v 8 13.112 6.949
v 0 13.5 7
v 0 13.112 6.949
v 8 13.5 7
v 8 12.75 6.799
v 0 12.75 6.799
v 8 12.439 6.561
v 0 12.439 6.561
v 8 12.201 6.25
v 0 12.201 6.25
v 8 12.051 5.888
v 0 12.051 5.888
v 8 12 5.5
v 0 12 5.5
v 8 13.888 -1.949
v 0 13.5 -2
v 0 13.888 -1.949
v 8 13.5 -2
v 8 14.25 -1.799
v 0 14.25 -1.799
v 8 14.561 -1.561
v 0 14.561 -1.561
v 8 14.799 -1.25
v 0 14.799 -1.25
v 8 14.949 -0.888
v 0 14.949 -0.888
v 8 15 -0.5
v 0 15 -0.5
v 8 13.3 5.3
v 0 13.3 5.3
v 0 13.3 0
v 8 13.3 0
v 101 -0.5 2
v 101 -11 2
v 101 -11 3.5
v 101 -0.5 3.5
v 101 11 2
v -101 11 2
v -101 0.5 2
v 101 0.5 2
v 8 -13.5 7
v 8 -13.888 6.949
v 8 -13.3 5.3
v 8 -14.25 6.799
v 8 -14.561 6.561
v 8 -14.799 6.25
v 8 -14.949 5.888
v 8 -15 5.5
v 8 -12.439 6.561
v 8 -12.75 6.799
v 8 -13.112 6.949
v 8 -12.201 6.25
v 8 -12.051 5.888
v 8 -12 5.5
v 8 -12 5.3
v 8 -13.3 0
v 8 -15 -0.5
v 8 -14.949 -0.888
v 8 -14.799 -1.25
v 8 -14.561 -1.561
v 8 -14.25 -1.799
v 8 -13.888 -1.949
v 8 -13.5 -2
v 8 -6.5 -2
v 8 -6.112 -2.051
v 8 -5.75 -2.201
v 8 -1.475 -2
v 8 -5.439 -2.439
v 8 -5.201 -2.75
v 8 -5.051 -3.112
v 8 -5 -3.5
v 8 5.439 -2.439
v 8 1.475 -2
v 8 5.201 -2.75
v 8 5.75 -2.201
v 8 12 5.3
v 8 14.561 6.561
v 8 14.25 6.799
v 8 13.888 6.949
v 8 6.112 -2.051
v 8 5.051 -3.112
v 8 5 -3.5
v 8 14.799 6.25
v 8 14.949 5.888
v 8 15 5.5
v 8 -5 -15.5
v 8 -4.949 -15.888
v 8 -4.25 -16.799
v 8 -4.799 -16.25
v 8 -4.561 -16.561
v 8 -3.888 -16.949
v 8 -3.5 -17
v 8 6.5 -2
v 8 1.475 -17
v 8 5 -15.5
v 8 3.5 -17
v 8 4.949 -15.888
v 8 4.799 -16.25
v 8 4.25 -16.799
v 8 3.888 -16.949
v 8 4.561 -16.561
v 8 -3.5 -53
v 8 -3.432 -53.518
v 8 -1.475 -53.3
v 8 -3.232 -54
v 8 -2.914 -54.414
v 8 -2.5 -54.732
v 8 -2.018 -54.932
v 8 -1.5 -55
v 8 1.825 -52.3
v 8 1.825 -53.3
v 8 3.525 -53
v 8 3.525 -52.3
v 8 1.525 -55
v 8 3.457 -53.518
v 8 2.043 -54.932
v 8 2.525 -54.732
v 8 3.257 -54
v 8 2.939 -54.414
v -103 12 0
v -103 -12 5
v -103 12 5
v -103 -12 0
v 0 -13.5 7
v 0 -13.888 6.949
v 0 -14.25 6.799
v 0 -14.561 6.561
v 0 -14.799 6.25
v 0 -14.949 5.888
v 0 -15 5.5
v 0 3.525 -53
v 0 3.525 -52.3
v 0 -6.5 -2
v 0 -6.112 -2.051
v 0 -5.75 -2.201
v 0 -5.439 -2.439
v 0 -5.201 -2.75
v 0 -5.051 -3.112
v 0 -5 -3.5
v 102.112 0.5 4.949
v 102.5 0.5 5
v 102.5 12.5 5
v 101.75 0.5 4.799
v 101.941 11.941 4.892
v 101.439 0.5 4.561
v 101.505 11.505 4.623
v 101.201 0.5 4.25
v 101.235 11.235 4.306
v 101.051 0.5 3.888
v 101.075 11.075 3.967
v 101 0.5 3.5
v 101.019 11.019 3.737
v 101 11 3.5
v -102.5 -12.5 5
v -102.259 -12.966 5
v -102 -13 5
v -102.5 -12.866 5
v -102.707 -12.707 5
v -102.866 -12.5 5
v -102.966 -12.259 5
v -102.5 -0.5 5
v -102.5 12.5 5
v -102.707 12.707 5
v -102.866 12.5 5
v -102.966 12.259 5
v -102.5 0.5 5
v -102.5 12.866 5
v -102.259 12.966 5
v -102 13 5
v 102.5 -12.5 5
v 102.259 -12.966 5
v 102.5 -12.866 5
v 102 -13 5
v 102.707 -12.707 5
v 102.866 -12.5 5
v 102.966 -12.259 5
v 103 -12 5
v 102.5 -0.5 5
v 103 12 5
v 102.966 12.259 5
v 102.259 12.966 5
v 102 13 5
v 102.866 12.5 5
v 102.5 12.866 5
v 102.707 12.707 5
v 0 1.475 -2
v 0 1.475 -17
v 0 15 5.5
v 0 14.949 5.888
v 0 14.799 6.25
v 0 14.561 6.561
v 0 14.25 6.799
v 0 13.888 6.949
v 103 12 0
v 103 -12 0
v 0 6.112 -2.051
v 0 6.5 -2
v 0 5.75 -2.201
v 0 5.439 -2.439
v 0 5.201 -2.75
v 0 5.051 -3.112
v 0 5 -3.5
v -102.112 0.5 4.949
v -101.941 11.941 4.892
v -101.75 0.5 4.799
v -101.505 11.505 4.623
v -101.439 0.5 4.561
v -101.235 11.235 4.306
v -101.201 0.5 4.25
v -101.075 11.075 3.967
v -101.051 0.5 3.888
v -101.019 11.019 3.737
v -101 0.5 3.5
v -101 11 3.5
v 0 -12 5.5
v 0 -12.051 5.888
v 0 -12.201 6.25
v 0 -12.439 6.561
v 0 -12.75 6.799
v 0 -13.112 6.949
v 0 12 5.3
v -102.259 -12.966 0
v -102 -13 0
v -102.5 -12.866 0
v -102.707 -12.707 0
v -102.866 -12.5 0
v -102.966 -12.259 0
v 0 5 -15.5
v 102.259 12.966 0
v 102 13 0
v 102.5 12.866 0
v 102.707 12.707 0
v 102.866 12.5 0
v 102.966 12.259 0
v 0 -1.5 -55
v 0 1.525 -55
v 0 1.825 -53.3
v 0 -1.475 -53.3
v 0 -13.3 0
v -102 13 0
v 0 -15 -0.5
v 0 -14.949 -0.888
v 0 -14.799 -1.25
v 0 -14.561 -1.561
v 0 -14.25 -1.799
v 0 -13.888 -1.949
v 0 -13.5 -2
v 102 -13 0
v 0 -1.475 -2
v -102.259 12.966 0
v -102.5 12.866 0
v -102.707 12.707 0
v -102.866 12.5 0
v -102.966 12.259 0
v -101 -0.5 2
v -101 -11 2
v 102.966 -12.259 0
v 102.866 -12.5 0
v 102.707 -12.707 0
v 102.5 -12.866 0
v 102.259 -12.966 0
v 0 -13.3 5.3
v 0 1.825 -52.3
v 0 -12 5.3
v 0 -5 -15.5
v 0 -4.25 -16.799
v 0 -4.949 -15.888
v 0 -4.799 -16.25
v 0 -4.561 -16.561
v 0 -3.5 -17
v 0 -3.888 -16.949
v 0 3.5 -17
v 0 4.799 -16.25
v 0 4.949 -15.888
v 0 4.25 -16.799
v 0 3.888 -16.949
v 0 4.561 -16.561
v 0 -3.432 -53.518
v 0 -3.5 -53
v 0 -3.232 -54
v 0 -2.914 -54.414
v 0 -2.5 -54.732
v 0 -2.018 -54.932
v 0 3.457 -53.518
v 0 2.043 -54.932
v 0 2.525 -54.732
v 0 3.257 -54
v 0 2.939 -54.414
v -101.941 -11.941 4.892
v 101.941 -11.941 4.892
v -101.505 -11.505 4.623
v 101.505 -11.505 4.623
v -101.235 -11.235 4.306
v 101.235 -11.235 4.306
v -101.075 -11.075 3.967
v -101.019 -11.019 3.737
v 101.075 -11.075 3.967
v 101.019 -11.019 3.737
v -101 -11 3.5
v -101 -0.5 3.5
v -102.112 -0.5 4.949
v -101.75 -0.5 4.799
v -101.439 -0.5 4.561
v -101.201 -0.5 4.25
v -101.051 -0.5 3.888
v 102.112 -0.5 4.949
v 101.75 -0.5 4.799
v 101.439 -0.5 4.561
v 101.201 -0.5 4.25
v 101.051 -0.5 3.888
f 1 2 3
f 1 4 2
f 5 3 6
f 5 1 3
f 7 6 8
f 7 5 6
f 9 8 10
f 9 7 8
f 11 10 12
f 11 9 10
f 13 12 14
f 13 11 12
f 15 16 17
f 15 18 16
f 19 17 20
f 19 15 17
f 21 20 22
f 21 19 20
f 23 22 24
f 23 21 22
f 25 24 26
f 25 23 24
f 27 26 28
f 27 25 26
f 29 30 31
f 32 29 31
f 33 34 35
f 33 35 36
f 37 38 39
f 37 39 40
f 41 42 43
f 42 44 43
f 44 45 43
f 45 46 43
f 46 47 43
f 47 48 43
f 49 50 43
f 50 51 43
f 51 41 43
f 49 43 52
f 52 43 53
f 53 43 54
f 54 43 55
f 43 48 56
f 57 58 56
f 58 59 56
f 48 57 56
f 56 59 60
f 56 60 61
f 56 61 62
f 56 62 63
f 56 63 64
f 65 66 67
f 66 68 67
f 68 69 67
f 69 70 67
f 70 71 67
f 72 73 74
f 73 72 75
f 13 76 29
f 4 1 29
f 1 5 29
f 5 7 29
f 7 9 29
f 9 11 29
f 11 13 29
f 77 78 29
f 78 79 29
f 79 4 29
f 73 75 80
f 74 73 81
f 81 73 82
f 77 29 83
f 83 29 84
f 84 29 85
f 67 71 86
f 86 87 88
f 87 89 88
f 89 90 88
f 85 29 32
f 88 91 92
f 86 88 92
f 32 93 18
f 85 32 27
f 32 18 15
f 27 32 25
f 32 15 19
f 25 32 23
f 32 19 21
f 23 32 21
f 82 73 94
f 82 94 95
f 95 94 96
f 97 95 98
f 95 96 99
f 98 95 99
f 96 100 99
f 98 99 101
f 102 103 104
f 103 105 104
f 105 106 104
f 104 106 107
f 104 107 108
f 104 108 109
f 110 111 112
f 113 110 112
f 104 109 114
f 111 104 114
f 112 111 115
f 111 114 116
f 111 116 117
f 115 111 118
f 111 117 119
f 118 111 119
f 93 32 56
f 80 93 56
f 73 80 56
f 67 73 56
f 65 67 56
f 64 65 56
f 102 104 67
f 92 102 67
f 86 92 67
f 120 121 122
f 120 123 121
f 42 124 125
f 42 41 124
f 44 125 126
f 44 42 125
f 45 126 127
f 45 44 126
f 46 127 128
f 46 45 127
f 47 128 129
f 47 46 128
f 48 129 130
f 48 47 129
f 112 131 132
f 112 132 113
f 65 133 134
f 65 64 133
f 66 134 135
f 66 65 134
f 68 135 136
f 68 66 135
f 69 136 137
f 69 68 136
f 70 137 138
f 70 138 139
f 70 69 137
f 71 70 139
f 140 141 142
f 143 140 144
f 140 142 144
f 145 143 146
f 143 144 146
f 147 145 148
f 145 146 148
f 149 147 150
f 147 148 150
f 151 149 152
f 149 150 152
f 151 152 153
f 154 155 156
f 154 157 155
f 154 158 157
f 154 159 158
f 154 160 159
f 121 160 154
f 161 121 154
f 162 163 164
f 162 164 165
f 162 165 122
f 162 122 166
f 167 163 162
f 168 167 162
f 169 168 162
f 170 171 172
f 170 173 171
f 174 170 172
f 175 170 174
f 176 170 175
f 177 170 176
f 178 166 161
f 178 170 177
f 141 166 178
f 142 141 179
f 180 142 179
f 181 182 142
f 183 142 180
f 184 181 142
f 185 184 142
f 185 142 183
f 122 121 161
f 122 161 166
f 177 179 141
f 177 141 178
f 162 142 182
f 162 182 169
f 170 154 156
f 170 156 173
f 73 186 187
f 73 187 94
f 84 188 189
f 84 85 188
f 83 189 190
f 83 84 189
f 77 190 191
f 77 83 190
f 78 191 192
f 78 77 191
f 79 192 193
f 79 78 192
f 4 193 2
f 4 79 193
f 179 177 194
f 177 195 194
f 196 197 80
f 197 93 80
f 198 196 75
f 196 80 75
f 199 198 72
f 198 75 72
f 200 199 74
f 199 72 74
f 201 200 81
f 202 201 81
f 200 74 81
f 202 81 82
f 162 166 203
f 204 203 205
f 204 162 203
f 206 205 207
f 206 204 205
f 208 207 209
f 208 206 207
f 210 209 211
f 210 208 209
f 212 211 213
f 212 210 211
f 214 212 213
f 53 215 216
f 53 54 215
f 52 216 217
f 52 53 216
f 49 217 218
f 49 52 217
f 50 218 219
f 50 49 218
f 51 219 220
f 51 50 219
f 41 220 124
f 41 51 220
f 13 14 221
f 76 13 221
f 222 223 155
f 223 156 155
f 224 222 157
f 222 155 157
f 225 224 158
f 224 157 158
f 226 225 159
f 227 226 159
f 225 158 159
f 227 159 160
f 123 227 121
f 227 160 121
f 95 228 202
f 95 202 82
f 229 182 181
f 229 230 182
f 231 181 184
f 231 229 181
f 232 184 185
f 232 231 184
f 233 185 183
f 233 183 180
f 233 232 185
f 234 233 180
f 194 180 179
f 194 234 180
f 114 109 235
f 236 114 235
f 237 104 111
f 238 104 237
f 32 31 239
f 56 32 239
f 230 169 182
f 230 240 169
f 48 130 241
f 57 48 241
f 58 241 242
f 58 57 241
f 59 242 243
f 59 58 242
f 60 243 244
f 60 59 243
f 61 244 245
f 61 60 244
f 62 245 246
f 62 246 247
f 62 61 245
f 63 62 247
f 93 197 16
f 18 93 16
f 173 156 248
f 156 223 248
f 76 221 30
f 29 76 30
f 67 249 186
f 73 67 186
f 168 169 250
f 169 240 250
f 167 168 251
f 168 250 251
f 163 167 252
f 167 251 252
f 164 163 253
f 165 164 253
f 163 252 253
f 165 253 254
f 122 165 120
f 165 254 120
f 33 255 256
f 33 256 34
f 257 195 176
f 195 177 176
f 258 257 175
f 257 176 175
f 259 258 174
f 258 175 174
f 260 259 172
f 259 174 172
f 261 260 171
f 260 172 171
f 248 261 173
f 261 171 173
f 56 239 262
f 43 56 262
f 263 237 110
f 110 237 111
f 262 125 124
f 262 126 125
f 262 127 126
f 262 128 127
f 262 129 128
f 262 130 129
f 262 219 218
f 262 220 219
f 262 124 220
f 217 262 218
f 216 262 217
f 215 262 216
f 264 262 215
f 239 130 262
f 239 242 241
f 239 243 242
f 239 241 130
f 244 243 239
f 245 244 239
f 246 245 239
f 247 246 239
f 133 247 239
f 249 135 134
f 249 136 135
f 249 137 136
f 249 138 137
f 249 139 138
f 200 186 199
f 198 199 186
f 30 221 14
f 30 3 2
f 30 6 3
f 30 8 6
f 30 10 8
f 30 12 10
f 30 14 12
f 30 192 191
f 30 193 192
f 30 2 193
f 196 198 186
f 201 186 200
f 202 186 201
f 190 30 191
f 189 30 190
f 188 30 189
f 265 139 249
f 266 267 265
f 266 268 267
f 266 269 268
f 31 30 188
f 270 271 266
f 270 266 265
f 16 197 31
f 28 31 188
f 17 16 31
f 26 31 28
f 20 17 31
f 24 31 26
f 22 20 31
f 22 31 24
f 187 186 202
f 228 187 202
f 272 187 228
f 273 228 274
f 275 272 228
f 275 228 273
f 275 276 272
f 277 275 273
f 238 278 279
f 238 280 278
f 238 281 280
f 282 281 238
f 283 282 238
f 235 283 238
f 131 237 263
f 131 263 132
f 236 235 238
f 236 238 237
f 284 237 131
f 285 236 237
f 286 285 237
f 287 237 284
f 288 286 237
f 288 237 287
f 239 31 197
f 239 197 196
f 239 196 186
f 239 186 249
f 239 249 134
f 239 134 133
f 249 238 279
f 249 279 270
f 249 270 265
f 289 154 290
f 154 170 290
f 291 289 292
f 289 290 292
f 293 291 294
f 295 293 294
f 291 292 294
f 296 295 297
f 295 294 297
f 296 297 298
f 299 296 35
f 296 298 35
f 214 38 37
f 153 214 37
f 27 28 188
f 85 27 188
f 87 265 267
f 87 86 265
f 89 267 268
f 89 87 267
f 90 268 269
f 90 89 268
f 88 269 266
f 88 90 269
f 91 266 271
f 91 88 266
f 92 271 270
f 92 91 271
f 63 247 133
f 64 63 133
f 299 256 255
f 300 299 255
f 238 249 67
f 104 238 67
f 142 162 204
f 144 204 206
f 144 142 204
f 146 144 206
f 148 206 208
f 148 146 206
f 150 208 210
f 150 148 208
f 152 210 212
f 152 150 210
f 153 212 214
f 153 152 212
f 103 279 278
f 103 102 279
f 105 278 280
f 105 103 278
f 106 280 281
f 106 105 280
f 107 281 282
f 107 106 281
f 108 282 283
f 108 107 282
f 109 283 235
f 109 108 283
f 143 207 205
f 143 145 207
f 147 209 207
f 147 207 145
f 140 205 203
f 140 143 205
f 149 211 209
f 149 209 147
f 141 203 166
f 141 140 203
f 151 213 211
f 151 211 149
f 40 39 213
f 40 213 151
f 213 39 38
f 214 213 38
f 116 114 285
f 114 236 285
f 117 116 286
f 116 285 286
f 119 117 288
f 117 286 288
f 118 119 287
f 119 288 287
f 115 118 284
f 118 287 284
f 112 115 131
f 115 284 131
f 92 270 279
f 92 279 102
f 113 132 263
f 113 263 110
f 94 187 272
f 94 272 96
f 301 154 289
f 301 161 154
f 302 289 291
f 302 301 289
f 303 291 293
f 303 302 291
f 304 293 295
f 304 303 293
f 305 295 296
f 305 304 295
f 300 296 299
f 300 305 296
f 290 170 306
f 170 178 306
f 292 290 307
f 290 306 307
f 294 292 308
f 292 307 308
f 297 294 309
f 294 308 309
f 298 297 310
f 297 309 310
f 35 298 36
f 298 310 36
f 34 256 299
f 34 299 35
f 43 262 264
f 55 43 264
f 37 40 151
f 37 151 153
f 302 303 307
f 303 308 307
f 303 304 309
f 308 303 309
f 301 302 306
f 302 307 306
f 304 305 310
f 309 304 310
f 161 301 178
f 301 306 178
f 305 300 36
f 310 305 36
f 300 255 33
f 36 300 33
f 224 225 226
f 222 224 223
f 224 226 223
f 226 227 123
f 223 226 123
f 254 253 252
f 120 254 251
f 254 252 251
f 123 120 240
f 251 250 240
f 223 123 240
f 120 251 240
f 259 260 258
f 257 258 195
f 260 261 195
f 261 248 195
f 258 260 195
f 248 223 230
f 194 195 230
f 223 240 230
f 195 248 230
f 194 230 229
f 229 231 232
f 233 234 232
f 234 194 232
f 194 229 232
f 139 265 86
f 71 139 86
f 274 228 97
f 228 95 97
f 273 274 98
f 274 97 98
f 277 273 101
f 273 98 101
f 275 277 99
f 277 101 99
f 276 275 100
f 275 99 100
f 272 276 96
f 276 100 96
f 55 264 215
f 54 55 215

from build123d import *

# Parameters (mm, degrees)
F0_W      = 206
F0_H      = 26
F1_DEPTH  = 2
F2_W      = 206
F2_H      = 26
F2_W_2    = 202
F2_H_2    = 10.5
F3_DEPTH  = 3
F4_R      = 1.5
F5_R      = 1
F7_DEPTH  = 8
F8_W      = 8
F8_H      = 3.525
F9_DEPTH  = 15
F10_R     = 1.49999
F11_W     = 8
F11_H     = 2.025
F12_DEPTH = 38
F13_W     = 8
F13_H     = 1.7
F14_DEPTH = 5
F15_W     = 8
F15_H     = 1.7
F16_DEPTH = 1
F17_R     = 2


# Not quite as in the source:
# - a fillet or chamfer is up to 0.001 mm smaller than in the source, because OpenCascade refuses the exact size


with BuildPart() as f1:
    # F0 (on Top) → F1 (new body)
    with BuildSketch(Plane.XY):
        Rectangle(F0_W, F0_H)
    extrude(amount=F1_DEPTH)

    # F2 (on face) → F3 (join)
    with BuildSketch(Plane.XY.offset(2)):
        Rectangle(F2_W, F2_H)
        with Locations((0, -5.75)):
            Rectangle(F2_W_2, F2_H_2, mode=Mode.SUBTRACT)
        with Locations((0, 5.75)):
            Rectangle(F2_W_2, F2_H_2, mode=Mode.SUBTRACT)
    extrude(amount=F3_DEPTH)

    # F4
    f4_edges = [f1.edges().sort_by_distance(p)[0] for p in [
        (-101, 5.75, 5),
        (0, 11, 5),
        (-101, -5.75, 5),
        (0, -11, 5),
        (101, 5.75, 5),
        (101, -5.75, 5),
    ]]
    fillet(f4_edges, radius=F4_R)

    # F5
    f5_edges = [f1.edges().sort_by_distance(p)[0] for p in [
        (103, 13, 2.5),
        (103, -13, 2.5),
        (-103, -13, 2.5),
        (-103, 13, 2.5),
    ]]
    fillet(f5_edges, radius=F5_R)


with BuildPart() as f7:
    # F6 (on Right) → F7 (new body)
    with BuildSketch(Plane.YZ):
        Polygon((13, 0), (12, 0), (-12, 0), (-13, 0), (-13.3, 0), (-13.3, 5.3), (-12, 5.3), (-12, 7), (-15, 7), (-15, -2), (-12, -2), (12, -2), (15, -2), (15, 7), (12, 7), (12, 5.3), (13.3, 5.3), (13.3, 0), align=None)
    extrude(amount=F7_DEPTH)

    # F8 (on face) → F9 (join)
    with BuildSketch(Plane(origin=(0, 0, -2), x_dir=(1, 0, 0), z_dir=(0, 0, -1))):
        with Locations((4, 3.2375)):
            Rectangle(F8_W, F8_H)
        with Locations((4, -3.2375)):
            Rectangle(F8_W, F8_H)
    extrude(amount=F9_DEPTH)

    # F10 (radius 1.5 in the source; OpenCascade refuses exactly that, so slightly less here)
    f10_edges = [f7.edges().sort_by_distance(p)[0] for p in [
        (4, -15, 7),
        (4, -15, -2),
        (4, 15, 7),
        (4, 15, -2),
        (4, 5, -2),
        (4, -5, -2),
        (4, -5, -17),
        (4, 5, -17),
        (4, -12, 7),
        (4, 12, 7),
    ]]
    fillet(f10_edges, radius=F10_R)

    # F11 (on face) → F12 (join)
    with BuildSketch(Plane(origin=(0, 0, -17), x_dir=(1, 0, 0), z_dir=(0, 0, -1))):
        with Locations((4, 2.4875)):
            Rectangle(F11_W, F11_H)
    extrude(amount=F12_DEPTH)

    # F13 (on face) → F14 (join)
    with BuildSketch(Plane(origin=(0, -1.475, 0), x_dir=(-1, 0, 0), z_dir=(0, 1, 0))):
        with Locations((-4, -54.15)):
            Rectangle(F13_W, F13_H)
    extrude(amount=F14_DEPTH)

    # F15 (on face) → F16 (join)
    with BuildSketch(Plane.XY.offset(-53.3)):
        with Locations((4, 2.675)):
            Rectangle(F15_W, F15_H)
    extrude(amount=F16_DEPTH)

    # F17
    f17_edges = [f7.edges().sort_by_distance(p)[0] for p in [
        (4, 3.525, -55),
        (4, -3.5, -55),
    ]]
    fillet(f17_edges, radius=F17_R)


solid = Compound([f1.part, f7.part])
